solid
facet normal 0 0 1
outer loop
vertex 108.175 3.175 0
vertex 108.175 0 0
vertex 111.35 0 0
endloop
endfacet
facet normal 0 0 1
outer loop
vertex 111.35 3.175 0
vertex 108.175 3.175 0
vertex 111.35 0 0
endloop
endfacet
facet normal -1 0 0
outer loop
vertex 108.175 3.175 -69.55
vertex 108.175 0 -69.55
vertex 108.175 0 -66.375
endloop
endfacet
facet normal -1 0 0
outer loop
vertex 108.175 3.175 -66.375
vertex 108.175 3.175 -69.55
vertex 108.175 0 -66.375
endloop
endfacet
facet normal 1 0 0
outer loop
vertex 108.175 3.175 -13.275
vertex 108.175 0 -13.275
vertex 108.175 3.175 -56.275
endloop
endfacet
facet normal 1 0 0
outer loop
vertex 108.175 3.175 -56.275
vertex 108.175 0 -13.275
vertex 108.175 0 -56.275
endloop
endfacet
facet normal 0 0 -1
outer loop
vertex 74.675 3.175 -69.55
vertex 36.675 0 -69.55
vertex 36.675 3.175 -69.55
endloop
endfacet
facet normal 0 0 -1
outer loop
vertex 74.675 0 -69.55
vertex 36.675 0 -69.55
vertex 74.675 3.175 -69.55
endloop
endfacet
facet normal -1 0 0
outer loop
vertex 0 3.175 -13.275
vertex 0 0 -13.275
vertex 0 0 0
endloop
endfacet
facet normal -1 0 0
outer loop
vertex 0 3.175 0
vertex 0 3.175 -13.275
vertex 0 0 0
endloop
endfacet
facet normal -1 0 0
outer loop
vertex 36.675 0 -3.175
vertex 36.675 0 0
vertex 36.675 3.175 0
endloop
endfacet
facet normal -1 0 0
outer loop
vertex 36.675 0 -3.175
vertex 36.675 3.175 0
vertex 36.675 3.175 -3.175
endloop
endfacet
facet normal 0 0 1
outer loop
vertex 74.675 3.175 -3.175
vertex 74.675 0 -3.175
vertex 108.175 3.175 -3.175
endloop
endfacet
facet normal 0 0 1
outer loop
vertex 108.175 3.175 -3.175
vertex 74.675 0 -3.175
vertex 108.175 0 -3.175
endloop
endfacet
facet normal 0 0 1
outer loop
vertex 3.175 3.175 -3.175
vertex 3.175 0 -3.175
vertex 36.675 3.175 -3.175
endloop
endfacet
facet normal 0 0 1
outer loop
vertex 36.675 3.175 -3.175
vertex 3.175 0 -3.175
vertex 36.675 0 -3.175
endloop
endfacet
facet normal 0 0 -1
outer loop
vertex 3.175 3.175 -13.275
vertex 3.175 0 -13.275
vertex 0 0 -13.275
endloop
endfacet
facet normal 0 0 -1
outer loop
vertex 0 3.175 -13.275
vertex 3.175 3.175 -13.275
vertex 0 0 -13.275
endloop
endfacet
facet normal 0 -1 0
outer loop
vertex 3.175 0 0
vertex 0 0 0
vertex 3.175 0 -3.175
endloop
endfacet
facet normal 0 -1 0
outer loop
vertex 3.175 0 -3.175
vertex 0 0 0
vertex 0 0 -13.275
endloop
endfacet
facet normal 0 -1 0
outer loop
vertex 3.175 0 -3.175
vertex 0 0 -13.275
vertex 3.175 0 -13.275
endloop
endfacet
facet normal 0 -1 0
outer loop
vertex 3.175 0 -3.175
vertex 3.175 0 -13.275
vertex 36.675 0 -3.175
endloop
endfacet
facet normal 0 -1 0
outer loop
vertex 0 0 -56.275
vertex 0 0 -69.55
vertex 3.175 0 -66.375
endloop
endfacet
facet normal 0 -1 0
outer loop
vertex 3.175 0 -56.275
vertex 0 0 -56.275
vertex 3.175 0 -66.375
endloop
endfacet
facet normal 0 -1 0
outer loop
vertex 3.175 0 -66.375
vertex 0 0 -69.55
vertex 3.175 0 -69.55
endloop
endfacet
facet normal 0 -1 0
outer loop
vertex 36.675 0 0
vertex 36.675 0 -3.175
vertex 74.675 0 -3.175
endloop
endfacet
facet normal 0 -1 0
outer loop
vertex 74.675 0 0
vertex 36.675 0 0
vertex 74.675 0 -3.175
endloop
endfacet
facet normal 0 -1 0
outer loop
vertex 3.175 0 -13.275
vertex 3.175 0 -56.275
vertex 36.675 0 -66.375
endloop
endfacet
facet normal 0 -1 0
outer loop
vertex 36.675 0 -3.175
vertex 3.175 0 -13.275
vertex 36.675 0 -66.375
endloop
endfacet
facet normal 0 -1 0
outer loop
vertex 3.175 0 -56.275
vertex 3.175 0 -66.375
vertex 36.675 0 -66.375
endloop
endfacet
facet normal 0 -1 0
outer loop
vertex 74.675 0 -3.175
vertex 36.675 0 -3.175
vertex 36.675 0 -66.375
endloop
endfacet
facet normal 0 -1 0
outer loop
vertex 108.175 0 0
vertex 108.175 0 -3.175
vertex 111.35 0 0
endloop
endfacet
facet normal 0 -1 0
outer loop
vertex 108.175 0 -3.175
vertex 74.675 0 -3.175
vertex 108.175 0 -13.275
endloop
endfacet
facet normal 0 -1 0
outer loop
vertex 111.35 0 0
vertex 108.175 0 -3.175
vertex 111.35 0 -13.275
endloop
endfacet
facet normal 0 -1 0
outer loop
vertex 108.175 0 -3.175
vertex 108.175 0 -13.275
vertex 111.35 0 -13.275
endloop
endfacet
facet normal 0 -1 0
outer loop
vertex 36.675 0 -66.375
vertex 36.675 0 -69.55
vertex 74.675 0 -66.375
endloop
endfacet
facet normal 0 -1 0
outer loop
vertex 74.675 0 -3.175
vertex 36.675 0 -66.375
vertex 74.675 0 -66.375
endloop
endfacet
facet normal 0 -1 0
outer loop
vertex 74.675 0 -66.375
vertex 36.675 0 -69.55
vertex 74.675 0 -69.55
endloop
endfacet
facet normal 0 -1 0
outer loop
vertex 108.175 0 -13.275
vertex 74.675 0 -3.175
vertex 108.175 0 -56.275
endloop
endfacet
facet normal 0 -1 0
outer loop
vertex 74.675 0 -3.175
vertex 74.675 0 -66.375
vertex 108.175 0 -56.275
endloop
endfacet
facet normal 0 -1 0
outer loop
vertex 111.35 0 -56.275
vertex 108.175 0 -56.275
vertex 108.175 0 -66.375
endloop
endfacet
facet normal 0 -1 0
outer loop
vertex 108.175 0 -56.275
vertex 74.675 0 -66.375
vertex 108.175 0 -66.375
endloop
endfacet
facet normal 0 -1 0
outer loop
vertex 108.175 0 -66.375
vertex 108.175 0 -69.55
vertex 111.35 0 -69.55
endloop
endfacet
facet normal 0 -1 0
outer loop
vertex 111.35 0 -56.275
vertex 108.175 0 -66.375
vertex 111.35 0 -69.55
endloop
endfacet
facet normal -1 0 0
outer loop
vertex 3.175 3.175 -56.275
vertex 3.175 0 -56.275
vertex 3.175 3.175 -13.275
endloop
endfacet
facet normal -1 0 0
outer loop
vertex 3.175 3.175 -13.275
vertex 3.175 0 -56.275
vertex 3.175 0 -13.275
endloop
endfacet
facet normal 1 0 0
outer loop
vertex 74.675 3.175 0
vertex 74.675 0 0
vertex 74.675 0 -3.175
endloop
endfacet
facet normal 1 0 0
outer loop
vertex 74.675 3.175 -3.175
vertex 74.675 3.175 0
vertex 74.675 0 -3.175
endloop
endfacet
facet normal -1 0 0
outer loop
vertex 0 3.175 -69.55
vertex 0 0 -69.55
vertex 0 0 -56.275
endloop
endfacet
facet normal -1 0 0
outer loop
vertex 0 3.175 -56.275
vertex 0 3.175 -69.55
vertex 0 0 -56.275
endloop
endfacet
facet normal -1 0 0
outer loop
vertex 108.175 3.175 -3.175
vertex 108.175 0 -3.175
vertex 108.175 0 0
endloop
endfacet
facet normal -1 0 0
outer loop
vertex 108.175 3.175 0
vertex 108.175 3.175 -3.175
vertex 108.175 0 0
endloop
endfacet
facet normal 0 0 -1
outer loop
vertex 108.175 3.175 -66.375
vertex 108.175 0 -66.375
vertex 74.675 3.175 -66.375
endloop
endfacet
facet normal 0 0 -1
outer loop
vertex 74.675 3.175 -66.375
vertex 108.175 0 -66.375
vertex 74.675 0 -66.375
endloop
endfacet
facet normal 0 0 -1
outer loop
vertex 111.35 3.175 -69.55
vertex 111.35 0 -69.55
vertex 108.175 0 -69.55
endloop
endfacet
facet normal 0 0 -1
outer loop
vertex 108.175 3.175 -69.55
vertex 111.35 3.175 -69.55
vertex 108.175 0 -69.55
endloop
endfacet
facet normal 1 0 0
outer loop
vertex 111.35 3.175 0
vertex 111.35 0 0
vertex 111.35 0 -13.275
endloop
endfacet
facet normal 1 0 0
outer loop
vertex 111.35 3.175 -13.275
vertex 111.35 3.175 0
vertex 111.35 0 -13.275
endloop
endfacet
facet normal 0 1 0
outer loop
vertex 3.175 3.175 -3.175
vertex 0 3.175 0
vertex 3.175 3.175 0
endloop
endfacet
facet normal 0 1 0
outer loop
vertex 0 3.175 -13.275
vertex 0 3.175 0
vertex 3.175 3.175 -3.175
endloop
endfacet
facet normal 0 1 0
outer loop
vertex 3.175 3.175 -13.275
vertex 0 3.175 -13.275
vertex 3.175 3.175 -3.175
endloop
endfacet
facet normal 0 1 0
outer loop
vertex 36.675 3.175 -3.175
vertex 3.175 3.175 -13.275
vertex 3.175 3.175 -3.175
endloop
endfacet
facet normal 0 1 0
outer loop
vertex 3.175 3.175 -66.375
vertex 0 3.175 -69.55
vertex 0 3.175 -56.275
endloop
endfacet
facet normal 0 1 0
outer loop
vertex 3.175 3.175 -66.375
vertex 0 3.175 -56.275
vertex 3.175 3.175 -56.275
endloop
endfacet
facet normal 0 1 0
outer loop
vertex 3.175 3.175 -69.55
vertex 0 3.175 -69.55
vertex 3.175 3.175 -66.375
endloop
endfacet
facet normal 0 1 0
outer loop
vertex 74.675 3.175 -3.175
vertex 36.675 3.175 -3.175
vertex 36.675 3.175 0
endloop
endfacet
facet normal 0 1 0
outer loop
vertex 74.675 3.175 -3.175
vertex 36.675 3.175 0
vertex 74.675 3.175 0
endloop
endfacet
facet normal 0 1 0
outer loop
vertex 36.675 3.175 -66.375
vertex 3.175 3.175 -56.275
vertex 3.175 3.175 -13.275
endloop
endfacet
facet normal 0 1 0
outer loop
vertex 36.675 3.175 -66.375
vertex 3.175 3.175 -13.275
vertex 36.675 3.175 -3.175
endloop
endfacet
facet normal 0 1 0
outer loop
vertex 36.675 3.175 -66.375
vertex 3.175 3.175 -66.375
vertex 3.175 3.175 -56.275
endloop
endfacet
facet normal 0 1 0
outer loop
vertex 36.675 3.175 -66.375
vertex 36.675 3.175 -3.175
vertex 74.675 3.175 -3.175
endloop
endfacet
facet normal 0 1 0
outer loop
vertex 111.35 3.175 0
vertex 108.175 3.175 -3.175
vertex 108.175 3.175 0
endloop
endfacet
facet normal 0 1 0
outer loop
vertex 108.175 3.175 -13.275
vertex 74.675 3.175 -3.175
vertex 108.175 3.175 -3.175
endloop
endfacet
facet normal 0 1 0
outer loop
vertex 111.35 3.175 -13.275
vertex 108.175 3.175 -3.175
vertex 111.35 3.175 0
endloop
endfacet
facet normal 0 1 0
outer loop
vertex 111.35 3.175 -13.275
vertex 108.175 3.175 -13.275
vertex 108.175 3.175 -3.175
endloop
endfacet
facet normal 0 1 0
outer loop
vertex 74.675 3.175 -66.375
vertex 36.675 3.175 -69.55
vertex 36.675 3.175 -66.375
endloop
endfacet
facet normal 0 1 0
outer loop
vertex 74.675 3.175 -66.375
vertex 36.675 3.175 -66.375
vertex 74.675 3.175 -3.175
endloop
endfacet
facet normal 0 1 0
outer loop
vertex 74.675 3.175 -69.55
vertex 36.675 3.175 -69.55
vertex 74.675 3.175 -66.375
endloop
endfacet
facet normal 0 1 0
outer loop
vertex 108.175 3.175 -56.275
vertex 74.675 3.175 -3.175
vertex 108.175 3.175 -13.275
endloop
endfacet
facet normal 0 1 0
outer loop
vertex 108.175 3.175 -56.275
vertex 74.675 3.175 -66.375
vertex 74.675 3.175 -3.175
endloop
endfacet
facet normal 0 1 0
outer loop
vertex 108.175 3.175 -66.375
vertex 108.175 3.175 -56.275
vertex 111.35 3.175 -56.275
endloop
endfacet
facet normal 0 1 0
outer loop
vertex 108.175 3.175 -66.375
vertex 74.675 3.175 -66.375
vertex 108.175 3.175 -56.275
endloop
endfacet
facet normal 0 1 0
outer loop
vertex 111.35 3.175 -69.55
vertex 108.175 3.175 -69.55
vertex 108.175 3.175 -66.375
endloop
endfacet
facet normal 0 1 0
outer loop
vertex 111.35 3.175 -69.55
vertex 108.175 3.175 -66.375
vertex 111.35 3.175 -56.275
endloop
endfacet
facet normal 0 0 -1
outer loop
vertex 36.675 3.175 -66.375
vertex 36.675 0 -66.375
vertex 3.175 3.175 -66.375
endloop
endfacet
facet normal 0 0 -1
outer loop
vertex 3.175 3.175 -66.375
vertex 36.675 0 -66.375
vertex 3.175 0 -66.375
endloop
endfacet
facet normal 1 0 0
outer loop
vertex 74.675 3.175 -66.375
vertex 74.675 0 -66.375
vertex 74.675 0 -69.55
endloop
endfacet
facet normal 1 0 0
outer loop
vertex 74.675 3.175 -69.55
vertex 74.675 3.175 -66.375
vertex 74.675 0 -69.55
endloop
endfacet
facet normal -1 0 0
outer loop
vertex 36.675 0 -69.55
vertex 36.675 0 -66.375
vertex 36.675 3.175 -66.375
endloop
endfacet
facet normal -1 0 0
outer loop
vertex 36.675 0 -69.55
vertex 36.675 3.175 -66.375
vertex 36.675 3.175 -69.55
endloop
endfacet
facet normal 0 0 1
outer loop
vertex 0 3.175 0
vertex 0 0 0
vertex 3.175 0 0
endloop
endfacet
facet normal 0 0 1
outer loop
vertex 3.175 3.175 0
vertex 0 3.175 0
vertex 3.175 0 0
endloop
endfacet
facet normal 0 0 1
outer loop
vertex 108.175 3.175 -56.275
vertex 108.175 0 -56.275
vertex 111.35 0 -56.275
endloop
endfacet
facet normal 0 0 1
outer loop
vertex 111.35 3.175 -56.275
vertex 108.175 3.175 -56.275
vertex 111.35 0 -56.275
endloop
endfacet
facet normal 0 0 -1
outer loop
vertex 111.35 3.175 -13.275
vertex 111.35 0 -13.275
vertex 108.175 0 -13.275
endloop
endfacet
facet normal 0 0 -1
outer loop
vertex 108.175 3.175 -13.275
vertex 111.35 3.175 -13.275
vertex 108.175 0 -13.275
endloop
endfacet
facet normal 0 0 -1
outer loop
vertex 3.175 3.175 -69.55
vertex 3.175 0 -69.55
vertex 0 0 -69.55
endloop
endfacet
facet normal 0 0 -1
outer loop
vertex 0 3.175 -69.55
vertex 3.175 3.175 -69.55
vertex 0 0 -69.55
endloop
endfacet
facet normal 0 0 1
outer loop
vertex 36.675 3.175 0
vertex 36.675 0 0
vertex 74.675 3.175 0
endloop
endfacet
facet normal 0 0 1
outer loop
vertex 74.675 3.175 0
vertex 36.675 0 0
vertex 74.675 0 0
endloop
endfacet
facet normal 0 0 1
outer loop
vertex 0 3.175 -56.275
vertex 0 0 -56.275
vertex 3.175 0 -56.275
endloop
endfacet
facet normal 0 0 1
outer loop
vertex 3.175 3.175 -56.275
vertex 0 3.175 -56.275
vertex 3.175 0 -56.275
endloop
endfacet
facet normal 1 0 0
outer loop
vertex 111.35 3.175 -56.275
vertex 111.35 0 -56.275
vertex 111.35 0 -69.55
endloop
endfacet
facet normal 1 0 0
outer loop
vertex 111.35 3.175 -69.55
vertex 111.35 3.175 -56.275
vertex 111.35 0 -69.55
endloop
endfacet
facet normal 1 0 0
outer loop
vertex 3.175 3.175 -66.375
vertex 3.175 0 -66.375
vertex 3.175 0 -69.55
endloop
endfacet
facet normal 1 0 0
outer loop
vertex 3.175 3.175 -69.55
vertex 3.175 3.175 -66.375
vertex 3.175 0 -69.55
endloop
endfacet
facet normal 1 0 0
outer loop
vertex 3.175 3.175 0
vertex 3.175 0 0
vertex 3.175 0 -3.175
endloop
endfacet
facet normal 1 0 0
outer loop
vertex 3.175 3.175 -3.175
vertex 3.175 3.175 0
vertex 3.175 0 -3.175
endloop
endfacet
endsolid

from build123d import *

# Parameters (mm, degrees)
SKETCH1_W           = 38
SKETCH1_H           = 3.175
BOSS_EXTRUDE1_DEPTH = 3.175


with BuildPart() as part:
    # Sketch1 → Boss-Extrude1 (new body)
    with BuildSketch(Plane(origin=(0, 0, 0), x_dir=(1, 0, 0), z_dir=(0, 1, 0))):
        Polygon((0, 13.275), (0, 0), (3.175, 0), (3.175, 3.175), (36.675, 3.175), (74.675, 3.175), (108.175, 3.175), (108.175, 0), (111.35, 0), (111.35, 13.275), (108.175, 13.275), (108.175, 56.275), (111.35, 56.275), (111.35, 69.55), (108.175, 69.55), (108.175, 66.375), (74.675, 66.375), (36.675, 66.375), (3.175, 66.375), (3.175, 69.55), (0, 69.55), (0, 56.275), (3.175, 56.275), (3.175, 13.275), align=None)
        with Locations((55.675, 67.9625)):
            Rectangle(SKETCH1_W, SKETCH1_H)
        with Locations((55.675, 1.5875)):
            Rectangle(SKETCH1_W, SKETCH1_H)
    extrude(amount=BOSS_EXTRUDE1_DEPTH)


solid = part.part
